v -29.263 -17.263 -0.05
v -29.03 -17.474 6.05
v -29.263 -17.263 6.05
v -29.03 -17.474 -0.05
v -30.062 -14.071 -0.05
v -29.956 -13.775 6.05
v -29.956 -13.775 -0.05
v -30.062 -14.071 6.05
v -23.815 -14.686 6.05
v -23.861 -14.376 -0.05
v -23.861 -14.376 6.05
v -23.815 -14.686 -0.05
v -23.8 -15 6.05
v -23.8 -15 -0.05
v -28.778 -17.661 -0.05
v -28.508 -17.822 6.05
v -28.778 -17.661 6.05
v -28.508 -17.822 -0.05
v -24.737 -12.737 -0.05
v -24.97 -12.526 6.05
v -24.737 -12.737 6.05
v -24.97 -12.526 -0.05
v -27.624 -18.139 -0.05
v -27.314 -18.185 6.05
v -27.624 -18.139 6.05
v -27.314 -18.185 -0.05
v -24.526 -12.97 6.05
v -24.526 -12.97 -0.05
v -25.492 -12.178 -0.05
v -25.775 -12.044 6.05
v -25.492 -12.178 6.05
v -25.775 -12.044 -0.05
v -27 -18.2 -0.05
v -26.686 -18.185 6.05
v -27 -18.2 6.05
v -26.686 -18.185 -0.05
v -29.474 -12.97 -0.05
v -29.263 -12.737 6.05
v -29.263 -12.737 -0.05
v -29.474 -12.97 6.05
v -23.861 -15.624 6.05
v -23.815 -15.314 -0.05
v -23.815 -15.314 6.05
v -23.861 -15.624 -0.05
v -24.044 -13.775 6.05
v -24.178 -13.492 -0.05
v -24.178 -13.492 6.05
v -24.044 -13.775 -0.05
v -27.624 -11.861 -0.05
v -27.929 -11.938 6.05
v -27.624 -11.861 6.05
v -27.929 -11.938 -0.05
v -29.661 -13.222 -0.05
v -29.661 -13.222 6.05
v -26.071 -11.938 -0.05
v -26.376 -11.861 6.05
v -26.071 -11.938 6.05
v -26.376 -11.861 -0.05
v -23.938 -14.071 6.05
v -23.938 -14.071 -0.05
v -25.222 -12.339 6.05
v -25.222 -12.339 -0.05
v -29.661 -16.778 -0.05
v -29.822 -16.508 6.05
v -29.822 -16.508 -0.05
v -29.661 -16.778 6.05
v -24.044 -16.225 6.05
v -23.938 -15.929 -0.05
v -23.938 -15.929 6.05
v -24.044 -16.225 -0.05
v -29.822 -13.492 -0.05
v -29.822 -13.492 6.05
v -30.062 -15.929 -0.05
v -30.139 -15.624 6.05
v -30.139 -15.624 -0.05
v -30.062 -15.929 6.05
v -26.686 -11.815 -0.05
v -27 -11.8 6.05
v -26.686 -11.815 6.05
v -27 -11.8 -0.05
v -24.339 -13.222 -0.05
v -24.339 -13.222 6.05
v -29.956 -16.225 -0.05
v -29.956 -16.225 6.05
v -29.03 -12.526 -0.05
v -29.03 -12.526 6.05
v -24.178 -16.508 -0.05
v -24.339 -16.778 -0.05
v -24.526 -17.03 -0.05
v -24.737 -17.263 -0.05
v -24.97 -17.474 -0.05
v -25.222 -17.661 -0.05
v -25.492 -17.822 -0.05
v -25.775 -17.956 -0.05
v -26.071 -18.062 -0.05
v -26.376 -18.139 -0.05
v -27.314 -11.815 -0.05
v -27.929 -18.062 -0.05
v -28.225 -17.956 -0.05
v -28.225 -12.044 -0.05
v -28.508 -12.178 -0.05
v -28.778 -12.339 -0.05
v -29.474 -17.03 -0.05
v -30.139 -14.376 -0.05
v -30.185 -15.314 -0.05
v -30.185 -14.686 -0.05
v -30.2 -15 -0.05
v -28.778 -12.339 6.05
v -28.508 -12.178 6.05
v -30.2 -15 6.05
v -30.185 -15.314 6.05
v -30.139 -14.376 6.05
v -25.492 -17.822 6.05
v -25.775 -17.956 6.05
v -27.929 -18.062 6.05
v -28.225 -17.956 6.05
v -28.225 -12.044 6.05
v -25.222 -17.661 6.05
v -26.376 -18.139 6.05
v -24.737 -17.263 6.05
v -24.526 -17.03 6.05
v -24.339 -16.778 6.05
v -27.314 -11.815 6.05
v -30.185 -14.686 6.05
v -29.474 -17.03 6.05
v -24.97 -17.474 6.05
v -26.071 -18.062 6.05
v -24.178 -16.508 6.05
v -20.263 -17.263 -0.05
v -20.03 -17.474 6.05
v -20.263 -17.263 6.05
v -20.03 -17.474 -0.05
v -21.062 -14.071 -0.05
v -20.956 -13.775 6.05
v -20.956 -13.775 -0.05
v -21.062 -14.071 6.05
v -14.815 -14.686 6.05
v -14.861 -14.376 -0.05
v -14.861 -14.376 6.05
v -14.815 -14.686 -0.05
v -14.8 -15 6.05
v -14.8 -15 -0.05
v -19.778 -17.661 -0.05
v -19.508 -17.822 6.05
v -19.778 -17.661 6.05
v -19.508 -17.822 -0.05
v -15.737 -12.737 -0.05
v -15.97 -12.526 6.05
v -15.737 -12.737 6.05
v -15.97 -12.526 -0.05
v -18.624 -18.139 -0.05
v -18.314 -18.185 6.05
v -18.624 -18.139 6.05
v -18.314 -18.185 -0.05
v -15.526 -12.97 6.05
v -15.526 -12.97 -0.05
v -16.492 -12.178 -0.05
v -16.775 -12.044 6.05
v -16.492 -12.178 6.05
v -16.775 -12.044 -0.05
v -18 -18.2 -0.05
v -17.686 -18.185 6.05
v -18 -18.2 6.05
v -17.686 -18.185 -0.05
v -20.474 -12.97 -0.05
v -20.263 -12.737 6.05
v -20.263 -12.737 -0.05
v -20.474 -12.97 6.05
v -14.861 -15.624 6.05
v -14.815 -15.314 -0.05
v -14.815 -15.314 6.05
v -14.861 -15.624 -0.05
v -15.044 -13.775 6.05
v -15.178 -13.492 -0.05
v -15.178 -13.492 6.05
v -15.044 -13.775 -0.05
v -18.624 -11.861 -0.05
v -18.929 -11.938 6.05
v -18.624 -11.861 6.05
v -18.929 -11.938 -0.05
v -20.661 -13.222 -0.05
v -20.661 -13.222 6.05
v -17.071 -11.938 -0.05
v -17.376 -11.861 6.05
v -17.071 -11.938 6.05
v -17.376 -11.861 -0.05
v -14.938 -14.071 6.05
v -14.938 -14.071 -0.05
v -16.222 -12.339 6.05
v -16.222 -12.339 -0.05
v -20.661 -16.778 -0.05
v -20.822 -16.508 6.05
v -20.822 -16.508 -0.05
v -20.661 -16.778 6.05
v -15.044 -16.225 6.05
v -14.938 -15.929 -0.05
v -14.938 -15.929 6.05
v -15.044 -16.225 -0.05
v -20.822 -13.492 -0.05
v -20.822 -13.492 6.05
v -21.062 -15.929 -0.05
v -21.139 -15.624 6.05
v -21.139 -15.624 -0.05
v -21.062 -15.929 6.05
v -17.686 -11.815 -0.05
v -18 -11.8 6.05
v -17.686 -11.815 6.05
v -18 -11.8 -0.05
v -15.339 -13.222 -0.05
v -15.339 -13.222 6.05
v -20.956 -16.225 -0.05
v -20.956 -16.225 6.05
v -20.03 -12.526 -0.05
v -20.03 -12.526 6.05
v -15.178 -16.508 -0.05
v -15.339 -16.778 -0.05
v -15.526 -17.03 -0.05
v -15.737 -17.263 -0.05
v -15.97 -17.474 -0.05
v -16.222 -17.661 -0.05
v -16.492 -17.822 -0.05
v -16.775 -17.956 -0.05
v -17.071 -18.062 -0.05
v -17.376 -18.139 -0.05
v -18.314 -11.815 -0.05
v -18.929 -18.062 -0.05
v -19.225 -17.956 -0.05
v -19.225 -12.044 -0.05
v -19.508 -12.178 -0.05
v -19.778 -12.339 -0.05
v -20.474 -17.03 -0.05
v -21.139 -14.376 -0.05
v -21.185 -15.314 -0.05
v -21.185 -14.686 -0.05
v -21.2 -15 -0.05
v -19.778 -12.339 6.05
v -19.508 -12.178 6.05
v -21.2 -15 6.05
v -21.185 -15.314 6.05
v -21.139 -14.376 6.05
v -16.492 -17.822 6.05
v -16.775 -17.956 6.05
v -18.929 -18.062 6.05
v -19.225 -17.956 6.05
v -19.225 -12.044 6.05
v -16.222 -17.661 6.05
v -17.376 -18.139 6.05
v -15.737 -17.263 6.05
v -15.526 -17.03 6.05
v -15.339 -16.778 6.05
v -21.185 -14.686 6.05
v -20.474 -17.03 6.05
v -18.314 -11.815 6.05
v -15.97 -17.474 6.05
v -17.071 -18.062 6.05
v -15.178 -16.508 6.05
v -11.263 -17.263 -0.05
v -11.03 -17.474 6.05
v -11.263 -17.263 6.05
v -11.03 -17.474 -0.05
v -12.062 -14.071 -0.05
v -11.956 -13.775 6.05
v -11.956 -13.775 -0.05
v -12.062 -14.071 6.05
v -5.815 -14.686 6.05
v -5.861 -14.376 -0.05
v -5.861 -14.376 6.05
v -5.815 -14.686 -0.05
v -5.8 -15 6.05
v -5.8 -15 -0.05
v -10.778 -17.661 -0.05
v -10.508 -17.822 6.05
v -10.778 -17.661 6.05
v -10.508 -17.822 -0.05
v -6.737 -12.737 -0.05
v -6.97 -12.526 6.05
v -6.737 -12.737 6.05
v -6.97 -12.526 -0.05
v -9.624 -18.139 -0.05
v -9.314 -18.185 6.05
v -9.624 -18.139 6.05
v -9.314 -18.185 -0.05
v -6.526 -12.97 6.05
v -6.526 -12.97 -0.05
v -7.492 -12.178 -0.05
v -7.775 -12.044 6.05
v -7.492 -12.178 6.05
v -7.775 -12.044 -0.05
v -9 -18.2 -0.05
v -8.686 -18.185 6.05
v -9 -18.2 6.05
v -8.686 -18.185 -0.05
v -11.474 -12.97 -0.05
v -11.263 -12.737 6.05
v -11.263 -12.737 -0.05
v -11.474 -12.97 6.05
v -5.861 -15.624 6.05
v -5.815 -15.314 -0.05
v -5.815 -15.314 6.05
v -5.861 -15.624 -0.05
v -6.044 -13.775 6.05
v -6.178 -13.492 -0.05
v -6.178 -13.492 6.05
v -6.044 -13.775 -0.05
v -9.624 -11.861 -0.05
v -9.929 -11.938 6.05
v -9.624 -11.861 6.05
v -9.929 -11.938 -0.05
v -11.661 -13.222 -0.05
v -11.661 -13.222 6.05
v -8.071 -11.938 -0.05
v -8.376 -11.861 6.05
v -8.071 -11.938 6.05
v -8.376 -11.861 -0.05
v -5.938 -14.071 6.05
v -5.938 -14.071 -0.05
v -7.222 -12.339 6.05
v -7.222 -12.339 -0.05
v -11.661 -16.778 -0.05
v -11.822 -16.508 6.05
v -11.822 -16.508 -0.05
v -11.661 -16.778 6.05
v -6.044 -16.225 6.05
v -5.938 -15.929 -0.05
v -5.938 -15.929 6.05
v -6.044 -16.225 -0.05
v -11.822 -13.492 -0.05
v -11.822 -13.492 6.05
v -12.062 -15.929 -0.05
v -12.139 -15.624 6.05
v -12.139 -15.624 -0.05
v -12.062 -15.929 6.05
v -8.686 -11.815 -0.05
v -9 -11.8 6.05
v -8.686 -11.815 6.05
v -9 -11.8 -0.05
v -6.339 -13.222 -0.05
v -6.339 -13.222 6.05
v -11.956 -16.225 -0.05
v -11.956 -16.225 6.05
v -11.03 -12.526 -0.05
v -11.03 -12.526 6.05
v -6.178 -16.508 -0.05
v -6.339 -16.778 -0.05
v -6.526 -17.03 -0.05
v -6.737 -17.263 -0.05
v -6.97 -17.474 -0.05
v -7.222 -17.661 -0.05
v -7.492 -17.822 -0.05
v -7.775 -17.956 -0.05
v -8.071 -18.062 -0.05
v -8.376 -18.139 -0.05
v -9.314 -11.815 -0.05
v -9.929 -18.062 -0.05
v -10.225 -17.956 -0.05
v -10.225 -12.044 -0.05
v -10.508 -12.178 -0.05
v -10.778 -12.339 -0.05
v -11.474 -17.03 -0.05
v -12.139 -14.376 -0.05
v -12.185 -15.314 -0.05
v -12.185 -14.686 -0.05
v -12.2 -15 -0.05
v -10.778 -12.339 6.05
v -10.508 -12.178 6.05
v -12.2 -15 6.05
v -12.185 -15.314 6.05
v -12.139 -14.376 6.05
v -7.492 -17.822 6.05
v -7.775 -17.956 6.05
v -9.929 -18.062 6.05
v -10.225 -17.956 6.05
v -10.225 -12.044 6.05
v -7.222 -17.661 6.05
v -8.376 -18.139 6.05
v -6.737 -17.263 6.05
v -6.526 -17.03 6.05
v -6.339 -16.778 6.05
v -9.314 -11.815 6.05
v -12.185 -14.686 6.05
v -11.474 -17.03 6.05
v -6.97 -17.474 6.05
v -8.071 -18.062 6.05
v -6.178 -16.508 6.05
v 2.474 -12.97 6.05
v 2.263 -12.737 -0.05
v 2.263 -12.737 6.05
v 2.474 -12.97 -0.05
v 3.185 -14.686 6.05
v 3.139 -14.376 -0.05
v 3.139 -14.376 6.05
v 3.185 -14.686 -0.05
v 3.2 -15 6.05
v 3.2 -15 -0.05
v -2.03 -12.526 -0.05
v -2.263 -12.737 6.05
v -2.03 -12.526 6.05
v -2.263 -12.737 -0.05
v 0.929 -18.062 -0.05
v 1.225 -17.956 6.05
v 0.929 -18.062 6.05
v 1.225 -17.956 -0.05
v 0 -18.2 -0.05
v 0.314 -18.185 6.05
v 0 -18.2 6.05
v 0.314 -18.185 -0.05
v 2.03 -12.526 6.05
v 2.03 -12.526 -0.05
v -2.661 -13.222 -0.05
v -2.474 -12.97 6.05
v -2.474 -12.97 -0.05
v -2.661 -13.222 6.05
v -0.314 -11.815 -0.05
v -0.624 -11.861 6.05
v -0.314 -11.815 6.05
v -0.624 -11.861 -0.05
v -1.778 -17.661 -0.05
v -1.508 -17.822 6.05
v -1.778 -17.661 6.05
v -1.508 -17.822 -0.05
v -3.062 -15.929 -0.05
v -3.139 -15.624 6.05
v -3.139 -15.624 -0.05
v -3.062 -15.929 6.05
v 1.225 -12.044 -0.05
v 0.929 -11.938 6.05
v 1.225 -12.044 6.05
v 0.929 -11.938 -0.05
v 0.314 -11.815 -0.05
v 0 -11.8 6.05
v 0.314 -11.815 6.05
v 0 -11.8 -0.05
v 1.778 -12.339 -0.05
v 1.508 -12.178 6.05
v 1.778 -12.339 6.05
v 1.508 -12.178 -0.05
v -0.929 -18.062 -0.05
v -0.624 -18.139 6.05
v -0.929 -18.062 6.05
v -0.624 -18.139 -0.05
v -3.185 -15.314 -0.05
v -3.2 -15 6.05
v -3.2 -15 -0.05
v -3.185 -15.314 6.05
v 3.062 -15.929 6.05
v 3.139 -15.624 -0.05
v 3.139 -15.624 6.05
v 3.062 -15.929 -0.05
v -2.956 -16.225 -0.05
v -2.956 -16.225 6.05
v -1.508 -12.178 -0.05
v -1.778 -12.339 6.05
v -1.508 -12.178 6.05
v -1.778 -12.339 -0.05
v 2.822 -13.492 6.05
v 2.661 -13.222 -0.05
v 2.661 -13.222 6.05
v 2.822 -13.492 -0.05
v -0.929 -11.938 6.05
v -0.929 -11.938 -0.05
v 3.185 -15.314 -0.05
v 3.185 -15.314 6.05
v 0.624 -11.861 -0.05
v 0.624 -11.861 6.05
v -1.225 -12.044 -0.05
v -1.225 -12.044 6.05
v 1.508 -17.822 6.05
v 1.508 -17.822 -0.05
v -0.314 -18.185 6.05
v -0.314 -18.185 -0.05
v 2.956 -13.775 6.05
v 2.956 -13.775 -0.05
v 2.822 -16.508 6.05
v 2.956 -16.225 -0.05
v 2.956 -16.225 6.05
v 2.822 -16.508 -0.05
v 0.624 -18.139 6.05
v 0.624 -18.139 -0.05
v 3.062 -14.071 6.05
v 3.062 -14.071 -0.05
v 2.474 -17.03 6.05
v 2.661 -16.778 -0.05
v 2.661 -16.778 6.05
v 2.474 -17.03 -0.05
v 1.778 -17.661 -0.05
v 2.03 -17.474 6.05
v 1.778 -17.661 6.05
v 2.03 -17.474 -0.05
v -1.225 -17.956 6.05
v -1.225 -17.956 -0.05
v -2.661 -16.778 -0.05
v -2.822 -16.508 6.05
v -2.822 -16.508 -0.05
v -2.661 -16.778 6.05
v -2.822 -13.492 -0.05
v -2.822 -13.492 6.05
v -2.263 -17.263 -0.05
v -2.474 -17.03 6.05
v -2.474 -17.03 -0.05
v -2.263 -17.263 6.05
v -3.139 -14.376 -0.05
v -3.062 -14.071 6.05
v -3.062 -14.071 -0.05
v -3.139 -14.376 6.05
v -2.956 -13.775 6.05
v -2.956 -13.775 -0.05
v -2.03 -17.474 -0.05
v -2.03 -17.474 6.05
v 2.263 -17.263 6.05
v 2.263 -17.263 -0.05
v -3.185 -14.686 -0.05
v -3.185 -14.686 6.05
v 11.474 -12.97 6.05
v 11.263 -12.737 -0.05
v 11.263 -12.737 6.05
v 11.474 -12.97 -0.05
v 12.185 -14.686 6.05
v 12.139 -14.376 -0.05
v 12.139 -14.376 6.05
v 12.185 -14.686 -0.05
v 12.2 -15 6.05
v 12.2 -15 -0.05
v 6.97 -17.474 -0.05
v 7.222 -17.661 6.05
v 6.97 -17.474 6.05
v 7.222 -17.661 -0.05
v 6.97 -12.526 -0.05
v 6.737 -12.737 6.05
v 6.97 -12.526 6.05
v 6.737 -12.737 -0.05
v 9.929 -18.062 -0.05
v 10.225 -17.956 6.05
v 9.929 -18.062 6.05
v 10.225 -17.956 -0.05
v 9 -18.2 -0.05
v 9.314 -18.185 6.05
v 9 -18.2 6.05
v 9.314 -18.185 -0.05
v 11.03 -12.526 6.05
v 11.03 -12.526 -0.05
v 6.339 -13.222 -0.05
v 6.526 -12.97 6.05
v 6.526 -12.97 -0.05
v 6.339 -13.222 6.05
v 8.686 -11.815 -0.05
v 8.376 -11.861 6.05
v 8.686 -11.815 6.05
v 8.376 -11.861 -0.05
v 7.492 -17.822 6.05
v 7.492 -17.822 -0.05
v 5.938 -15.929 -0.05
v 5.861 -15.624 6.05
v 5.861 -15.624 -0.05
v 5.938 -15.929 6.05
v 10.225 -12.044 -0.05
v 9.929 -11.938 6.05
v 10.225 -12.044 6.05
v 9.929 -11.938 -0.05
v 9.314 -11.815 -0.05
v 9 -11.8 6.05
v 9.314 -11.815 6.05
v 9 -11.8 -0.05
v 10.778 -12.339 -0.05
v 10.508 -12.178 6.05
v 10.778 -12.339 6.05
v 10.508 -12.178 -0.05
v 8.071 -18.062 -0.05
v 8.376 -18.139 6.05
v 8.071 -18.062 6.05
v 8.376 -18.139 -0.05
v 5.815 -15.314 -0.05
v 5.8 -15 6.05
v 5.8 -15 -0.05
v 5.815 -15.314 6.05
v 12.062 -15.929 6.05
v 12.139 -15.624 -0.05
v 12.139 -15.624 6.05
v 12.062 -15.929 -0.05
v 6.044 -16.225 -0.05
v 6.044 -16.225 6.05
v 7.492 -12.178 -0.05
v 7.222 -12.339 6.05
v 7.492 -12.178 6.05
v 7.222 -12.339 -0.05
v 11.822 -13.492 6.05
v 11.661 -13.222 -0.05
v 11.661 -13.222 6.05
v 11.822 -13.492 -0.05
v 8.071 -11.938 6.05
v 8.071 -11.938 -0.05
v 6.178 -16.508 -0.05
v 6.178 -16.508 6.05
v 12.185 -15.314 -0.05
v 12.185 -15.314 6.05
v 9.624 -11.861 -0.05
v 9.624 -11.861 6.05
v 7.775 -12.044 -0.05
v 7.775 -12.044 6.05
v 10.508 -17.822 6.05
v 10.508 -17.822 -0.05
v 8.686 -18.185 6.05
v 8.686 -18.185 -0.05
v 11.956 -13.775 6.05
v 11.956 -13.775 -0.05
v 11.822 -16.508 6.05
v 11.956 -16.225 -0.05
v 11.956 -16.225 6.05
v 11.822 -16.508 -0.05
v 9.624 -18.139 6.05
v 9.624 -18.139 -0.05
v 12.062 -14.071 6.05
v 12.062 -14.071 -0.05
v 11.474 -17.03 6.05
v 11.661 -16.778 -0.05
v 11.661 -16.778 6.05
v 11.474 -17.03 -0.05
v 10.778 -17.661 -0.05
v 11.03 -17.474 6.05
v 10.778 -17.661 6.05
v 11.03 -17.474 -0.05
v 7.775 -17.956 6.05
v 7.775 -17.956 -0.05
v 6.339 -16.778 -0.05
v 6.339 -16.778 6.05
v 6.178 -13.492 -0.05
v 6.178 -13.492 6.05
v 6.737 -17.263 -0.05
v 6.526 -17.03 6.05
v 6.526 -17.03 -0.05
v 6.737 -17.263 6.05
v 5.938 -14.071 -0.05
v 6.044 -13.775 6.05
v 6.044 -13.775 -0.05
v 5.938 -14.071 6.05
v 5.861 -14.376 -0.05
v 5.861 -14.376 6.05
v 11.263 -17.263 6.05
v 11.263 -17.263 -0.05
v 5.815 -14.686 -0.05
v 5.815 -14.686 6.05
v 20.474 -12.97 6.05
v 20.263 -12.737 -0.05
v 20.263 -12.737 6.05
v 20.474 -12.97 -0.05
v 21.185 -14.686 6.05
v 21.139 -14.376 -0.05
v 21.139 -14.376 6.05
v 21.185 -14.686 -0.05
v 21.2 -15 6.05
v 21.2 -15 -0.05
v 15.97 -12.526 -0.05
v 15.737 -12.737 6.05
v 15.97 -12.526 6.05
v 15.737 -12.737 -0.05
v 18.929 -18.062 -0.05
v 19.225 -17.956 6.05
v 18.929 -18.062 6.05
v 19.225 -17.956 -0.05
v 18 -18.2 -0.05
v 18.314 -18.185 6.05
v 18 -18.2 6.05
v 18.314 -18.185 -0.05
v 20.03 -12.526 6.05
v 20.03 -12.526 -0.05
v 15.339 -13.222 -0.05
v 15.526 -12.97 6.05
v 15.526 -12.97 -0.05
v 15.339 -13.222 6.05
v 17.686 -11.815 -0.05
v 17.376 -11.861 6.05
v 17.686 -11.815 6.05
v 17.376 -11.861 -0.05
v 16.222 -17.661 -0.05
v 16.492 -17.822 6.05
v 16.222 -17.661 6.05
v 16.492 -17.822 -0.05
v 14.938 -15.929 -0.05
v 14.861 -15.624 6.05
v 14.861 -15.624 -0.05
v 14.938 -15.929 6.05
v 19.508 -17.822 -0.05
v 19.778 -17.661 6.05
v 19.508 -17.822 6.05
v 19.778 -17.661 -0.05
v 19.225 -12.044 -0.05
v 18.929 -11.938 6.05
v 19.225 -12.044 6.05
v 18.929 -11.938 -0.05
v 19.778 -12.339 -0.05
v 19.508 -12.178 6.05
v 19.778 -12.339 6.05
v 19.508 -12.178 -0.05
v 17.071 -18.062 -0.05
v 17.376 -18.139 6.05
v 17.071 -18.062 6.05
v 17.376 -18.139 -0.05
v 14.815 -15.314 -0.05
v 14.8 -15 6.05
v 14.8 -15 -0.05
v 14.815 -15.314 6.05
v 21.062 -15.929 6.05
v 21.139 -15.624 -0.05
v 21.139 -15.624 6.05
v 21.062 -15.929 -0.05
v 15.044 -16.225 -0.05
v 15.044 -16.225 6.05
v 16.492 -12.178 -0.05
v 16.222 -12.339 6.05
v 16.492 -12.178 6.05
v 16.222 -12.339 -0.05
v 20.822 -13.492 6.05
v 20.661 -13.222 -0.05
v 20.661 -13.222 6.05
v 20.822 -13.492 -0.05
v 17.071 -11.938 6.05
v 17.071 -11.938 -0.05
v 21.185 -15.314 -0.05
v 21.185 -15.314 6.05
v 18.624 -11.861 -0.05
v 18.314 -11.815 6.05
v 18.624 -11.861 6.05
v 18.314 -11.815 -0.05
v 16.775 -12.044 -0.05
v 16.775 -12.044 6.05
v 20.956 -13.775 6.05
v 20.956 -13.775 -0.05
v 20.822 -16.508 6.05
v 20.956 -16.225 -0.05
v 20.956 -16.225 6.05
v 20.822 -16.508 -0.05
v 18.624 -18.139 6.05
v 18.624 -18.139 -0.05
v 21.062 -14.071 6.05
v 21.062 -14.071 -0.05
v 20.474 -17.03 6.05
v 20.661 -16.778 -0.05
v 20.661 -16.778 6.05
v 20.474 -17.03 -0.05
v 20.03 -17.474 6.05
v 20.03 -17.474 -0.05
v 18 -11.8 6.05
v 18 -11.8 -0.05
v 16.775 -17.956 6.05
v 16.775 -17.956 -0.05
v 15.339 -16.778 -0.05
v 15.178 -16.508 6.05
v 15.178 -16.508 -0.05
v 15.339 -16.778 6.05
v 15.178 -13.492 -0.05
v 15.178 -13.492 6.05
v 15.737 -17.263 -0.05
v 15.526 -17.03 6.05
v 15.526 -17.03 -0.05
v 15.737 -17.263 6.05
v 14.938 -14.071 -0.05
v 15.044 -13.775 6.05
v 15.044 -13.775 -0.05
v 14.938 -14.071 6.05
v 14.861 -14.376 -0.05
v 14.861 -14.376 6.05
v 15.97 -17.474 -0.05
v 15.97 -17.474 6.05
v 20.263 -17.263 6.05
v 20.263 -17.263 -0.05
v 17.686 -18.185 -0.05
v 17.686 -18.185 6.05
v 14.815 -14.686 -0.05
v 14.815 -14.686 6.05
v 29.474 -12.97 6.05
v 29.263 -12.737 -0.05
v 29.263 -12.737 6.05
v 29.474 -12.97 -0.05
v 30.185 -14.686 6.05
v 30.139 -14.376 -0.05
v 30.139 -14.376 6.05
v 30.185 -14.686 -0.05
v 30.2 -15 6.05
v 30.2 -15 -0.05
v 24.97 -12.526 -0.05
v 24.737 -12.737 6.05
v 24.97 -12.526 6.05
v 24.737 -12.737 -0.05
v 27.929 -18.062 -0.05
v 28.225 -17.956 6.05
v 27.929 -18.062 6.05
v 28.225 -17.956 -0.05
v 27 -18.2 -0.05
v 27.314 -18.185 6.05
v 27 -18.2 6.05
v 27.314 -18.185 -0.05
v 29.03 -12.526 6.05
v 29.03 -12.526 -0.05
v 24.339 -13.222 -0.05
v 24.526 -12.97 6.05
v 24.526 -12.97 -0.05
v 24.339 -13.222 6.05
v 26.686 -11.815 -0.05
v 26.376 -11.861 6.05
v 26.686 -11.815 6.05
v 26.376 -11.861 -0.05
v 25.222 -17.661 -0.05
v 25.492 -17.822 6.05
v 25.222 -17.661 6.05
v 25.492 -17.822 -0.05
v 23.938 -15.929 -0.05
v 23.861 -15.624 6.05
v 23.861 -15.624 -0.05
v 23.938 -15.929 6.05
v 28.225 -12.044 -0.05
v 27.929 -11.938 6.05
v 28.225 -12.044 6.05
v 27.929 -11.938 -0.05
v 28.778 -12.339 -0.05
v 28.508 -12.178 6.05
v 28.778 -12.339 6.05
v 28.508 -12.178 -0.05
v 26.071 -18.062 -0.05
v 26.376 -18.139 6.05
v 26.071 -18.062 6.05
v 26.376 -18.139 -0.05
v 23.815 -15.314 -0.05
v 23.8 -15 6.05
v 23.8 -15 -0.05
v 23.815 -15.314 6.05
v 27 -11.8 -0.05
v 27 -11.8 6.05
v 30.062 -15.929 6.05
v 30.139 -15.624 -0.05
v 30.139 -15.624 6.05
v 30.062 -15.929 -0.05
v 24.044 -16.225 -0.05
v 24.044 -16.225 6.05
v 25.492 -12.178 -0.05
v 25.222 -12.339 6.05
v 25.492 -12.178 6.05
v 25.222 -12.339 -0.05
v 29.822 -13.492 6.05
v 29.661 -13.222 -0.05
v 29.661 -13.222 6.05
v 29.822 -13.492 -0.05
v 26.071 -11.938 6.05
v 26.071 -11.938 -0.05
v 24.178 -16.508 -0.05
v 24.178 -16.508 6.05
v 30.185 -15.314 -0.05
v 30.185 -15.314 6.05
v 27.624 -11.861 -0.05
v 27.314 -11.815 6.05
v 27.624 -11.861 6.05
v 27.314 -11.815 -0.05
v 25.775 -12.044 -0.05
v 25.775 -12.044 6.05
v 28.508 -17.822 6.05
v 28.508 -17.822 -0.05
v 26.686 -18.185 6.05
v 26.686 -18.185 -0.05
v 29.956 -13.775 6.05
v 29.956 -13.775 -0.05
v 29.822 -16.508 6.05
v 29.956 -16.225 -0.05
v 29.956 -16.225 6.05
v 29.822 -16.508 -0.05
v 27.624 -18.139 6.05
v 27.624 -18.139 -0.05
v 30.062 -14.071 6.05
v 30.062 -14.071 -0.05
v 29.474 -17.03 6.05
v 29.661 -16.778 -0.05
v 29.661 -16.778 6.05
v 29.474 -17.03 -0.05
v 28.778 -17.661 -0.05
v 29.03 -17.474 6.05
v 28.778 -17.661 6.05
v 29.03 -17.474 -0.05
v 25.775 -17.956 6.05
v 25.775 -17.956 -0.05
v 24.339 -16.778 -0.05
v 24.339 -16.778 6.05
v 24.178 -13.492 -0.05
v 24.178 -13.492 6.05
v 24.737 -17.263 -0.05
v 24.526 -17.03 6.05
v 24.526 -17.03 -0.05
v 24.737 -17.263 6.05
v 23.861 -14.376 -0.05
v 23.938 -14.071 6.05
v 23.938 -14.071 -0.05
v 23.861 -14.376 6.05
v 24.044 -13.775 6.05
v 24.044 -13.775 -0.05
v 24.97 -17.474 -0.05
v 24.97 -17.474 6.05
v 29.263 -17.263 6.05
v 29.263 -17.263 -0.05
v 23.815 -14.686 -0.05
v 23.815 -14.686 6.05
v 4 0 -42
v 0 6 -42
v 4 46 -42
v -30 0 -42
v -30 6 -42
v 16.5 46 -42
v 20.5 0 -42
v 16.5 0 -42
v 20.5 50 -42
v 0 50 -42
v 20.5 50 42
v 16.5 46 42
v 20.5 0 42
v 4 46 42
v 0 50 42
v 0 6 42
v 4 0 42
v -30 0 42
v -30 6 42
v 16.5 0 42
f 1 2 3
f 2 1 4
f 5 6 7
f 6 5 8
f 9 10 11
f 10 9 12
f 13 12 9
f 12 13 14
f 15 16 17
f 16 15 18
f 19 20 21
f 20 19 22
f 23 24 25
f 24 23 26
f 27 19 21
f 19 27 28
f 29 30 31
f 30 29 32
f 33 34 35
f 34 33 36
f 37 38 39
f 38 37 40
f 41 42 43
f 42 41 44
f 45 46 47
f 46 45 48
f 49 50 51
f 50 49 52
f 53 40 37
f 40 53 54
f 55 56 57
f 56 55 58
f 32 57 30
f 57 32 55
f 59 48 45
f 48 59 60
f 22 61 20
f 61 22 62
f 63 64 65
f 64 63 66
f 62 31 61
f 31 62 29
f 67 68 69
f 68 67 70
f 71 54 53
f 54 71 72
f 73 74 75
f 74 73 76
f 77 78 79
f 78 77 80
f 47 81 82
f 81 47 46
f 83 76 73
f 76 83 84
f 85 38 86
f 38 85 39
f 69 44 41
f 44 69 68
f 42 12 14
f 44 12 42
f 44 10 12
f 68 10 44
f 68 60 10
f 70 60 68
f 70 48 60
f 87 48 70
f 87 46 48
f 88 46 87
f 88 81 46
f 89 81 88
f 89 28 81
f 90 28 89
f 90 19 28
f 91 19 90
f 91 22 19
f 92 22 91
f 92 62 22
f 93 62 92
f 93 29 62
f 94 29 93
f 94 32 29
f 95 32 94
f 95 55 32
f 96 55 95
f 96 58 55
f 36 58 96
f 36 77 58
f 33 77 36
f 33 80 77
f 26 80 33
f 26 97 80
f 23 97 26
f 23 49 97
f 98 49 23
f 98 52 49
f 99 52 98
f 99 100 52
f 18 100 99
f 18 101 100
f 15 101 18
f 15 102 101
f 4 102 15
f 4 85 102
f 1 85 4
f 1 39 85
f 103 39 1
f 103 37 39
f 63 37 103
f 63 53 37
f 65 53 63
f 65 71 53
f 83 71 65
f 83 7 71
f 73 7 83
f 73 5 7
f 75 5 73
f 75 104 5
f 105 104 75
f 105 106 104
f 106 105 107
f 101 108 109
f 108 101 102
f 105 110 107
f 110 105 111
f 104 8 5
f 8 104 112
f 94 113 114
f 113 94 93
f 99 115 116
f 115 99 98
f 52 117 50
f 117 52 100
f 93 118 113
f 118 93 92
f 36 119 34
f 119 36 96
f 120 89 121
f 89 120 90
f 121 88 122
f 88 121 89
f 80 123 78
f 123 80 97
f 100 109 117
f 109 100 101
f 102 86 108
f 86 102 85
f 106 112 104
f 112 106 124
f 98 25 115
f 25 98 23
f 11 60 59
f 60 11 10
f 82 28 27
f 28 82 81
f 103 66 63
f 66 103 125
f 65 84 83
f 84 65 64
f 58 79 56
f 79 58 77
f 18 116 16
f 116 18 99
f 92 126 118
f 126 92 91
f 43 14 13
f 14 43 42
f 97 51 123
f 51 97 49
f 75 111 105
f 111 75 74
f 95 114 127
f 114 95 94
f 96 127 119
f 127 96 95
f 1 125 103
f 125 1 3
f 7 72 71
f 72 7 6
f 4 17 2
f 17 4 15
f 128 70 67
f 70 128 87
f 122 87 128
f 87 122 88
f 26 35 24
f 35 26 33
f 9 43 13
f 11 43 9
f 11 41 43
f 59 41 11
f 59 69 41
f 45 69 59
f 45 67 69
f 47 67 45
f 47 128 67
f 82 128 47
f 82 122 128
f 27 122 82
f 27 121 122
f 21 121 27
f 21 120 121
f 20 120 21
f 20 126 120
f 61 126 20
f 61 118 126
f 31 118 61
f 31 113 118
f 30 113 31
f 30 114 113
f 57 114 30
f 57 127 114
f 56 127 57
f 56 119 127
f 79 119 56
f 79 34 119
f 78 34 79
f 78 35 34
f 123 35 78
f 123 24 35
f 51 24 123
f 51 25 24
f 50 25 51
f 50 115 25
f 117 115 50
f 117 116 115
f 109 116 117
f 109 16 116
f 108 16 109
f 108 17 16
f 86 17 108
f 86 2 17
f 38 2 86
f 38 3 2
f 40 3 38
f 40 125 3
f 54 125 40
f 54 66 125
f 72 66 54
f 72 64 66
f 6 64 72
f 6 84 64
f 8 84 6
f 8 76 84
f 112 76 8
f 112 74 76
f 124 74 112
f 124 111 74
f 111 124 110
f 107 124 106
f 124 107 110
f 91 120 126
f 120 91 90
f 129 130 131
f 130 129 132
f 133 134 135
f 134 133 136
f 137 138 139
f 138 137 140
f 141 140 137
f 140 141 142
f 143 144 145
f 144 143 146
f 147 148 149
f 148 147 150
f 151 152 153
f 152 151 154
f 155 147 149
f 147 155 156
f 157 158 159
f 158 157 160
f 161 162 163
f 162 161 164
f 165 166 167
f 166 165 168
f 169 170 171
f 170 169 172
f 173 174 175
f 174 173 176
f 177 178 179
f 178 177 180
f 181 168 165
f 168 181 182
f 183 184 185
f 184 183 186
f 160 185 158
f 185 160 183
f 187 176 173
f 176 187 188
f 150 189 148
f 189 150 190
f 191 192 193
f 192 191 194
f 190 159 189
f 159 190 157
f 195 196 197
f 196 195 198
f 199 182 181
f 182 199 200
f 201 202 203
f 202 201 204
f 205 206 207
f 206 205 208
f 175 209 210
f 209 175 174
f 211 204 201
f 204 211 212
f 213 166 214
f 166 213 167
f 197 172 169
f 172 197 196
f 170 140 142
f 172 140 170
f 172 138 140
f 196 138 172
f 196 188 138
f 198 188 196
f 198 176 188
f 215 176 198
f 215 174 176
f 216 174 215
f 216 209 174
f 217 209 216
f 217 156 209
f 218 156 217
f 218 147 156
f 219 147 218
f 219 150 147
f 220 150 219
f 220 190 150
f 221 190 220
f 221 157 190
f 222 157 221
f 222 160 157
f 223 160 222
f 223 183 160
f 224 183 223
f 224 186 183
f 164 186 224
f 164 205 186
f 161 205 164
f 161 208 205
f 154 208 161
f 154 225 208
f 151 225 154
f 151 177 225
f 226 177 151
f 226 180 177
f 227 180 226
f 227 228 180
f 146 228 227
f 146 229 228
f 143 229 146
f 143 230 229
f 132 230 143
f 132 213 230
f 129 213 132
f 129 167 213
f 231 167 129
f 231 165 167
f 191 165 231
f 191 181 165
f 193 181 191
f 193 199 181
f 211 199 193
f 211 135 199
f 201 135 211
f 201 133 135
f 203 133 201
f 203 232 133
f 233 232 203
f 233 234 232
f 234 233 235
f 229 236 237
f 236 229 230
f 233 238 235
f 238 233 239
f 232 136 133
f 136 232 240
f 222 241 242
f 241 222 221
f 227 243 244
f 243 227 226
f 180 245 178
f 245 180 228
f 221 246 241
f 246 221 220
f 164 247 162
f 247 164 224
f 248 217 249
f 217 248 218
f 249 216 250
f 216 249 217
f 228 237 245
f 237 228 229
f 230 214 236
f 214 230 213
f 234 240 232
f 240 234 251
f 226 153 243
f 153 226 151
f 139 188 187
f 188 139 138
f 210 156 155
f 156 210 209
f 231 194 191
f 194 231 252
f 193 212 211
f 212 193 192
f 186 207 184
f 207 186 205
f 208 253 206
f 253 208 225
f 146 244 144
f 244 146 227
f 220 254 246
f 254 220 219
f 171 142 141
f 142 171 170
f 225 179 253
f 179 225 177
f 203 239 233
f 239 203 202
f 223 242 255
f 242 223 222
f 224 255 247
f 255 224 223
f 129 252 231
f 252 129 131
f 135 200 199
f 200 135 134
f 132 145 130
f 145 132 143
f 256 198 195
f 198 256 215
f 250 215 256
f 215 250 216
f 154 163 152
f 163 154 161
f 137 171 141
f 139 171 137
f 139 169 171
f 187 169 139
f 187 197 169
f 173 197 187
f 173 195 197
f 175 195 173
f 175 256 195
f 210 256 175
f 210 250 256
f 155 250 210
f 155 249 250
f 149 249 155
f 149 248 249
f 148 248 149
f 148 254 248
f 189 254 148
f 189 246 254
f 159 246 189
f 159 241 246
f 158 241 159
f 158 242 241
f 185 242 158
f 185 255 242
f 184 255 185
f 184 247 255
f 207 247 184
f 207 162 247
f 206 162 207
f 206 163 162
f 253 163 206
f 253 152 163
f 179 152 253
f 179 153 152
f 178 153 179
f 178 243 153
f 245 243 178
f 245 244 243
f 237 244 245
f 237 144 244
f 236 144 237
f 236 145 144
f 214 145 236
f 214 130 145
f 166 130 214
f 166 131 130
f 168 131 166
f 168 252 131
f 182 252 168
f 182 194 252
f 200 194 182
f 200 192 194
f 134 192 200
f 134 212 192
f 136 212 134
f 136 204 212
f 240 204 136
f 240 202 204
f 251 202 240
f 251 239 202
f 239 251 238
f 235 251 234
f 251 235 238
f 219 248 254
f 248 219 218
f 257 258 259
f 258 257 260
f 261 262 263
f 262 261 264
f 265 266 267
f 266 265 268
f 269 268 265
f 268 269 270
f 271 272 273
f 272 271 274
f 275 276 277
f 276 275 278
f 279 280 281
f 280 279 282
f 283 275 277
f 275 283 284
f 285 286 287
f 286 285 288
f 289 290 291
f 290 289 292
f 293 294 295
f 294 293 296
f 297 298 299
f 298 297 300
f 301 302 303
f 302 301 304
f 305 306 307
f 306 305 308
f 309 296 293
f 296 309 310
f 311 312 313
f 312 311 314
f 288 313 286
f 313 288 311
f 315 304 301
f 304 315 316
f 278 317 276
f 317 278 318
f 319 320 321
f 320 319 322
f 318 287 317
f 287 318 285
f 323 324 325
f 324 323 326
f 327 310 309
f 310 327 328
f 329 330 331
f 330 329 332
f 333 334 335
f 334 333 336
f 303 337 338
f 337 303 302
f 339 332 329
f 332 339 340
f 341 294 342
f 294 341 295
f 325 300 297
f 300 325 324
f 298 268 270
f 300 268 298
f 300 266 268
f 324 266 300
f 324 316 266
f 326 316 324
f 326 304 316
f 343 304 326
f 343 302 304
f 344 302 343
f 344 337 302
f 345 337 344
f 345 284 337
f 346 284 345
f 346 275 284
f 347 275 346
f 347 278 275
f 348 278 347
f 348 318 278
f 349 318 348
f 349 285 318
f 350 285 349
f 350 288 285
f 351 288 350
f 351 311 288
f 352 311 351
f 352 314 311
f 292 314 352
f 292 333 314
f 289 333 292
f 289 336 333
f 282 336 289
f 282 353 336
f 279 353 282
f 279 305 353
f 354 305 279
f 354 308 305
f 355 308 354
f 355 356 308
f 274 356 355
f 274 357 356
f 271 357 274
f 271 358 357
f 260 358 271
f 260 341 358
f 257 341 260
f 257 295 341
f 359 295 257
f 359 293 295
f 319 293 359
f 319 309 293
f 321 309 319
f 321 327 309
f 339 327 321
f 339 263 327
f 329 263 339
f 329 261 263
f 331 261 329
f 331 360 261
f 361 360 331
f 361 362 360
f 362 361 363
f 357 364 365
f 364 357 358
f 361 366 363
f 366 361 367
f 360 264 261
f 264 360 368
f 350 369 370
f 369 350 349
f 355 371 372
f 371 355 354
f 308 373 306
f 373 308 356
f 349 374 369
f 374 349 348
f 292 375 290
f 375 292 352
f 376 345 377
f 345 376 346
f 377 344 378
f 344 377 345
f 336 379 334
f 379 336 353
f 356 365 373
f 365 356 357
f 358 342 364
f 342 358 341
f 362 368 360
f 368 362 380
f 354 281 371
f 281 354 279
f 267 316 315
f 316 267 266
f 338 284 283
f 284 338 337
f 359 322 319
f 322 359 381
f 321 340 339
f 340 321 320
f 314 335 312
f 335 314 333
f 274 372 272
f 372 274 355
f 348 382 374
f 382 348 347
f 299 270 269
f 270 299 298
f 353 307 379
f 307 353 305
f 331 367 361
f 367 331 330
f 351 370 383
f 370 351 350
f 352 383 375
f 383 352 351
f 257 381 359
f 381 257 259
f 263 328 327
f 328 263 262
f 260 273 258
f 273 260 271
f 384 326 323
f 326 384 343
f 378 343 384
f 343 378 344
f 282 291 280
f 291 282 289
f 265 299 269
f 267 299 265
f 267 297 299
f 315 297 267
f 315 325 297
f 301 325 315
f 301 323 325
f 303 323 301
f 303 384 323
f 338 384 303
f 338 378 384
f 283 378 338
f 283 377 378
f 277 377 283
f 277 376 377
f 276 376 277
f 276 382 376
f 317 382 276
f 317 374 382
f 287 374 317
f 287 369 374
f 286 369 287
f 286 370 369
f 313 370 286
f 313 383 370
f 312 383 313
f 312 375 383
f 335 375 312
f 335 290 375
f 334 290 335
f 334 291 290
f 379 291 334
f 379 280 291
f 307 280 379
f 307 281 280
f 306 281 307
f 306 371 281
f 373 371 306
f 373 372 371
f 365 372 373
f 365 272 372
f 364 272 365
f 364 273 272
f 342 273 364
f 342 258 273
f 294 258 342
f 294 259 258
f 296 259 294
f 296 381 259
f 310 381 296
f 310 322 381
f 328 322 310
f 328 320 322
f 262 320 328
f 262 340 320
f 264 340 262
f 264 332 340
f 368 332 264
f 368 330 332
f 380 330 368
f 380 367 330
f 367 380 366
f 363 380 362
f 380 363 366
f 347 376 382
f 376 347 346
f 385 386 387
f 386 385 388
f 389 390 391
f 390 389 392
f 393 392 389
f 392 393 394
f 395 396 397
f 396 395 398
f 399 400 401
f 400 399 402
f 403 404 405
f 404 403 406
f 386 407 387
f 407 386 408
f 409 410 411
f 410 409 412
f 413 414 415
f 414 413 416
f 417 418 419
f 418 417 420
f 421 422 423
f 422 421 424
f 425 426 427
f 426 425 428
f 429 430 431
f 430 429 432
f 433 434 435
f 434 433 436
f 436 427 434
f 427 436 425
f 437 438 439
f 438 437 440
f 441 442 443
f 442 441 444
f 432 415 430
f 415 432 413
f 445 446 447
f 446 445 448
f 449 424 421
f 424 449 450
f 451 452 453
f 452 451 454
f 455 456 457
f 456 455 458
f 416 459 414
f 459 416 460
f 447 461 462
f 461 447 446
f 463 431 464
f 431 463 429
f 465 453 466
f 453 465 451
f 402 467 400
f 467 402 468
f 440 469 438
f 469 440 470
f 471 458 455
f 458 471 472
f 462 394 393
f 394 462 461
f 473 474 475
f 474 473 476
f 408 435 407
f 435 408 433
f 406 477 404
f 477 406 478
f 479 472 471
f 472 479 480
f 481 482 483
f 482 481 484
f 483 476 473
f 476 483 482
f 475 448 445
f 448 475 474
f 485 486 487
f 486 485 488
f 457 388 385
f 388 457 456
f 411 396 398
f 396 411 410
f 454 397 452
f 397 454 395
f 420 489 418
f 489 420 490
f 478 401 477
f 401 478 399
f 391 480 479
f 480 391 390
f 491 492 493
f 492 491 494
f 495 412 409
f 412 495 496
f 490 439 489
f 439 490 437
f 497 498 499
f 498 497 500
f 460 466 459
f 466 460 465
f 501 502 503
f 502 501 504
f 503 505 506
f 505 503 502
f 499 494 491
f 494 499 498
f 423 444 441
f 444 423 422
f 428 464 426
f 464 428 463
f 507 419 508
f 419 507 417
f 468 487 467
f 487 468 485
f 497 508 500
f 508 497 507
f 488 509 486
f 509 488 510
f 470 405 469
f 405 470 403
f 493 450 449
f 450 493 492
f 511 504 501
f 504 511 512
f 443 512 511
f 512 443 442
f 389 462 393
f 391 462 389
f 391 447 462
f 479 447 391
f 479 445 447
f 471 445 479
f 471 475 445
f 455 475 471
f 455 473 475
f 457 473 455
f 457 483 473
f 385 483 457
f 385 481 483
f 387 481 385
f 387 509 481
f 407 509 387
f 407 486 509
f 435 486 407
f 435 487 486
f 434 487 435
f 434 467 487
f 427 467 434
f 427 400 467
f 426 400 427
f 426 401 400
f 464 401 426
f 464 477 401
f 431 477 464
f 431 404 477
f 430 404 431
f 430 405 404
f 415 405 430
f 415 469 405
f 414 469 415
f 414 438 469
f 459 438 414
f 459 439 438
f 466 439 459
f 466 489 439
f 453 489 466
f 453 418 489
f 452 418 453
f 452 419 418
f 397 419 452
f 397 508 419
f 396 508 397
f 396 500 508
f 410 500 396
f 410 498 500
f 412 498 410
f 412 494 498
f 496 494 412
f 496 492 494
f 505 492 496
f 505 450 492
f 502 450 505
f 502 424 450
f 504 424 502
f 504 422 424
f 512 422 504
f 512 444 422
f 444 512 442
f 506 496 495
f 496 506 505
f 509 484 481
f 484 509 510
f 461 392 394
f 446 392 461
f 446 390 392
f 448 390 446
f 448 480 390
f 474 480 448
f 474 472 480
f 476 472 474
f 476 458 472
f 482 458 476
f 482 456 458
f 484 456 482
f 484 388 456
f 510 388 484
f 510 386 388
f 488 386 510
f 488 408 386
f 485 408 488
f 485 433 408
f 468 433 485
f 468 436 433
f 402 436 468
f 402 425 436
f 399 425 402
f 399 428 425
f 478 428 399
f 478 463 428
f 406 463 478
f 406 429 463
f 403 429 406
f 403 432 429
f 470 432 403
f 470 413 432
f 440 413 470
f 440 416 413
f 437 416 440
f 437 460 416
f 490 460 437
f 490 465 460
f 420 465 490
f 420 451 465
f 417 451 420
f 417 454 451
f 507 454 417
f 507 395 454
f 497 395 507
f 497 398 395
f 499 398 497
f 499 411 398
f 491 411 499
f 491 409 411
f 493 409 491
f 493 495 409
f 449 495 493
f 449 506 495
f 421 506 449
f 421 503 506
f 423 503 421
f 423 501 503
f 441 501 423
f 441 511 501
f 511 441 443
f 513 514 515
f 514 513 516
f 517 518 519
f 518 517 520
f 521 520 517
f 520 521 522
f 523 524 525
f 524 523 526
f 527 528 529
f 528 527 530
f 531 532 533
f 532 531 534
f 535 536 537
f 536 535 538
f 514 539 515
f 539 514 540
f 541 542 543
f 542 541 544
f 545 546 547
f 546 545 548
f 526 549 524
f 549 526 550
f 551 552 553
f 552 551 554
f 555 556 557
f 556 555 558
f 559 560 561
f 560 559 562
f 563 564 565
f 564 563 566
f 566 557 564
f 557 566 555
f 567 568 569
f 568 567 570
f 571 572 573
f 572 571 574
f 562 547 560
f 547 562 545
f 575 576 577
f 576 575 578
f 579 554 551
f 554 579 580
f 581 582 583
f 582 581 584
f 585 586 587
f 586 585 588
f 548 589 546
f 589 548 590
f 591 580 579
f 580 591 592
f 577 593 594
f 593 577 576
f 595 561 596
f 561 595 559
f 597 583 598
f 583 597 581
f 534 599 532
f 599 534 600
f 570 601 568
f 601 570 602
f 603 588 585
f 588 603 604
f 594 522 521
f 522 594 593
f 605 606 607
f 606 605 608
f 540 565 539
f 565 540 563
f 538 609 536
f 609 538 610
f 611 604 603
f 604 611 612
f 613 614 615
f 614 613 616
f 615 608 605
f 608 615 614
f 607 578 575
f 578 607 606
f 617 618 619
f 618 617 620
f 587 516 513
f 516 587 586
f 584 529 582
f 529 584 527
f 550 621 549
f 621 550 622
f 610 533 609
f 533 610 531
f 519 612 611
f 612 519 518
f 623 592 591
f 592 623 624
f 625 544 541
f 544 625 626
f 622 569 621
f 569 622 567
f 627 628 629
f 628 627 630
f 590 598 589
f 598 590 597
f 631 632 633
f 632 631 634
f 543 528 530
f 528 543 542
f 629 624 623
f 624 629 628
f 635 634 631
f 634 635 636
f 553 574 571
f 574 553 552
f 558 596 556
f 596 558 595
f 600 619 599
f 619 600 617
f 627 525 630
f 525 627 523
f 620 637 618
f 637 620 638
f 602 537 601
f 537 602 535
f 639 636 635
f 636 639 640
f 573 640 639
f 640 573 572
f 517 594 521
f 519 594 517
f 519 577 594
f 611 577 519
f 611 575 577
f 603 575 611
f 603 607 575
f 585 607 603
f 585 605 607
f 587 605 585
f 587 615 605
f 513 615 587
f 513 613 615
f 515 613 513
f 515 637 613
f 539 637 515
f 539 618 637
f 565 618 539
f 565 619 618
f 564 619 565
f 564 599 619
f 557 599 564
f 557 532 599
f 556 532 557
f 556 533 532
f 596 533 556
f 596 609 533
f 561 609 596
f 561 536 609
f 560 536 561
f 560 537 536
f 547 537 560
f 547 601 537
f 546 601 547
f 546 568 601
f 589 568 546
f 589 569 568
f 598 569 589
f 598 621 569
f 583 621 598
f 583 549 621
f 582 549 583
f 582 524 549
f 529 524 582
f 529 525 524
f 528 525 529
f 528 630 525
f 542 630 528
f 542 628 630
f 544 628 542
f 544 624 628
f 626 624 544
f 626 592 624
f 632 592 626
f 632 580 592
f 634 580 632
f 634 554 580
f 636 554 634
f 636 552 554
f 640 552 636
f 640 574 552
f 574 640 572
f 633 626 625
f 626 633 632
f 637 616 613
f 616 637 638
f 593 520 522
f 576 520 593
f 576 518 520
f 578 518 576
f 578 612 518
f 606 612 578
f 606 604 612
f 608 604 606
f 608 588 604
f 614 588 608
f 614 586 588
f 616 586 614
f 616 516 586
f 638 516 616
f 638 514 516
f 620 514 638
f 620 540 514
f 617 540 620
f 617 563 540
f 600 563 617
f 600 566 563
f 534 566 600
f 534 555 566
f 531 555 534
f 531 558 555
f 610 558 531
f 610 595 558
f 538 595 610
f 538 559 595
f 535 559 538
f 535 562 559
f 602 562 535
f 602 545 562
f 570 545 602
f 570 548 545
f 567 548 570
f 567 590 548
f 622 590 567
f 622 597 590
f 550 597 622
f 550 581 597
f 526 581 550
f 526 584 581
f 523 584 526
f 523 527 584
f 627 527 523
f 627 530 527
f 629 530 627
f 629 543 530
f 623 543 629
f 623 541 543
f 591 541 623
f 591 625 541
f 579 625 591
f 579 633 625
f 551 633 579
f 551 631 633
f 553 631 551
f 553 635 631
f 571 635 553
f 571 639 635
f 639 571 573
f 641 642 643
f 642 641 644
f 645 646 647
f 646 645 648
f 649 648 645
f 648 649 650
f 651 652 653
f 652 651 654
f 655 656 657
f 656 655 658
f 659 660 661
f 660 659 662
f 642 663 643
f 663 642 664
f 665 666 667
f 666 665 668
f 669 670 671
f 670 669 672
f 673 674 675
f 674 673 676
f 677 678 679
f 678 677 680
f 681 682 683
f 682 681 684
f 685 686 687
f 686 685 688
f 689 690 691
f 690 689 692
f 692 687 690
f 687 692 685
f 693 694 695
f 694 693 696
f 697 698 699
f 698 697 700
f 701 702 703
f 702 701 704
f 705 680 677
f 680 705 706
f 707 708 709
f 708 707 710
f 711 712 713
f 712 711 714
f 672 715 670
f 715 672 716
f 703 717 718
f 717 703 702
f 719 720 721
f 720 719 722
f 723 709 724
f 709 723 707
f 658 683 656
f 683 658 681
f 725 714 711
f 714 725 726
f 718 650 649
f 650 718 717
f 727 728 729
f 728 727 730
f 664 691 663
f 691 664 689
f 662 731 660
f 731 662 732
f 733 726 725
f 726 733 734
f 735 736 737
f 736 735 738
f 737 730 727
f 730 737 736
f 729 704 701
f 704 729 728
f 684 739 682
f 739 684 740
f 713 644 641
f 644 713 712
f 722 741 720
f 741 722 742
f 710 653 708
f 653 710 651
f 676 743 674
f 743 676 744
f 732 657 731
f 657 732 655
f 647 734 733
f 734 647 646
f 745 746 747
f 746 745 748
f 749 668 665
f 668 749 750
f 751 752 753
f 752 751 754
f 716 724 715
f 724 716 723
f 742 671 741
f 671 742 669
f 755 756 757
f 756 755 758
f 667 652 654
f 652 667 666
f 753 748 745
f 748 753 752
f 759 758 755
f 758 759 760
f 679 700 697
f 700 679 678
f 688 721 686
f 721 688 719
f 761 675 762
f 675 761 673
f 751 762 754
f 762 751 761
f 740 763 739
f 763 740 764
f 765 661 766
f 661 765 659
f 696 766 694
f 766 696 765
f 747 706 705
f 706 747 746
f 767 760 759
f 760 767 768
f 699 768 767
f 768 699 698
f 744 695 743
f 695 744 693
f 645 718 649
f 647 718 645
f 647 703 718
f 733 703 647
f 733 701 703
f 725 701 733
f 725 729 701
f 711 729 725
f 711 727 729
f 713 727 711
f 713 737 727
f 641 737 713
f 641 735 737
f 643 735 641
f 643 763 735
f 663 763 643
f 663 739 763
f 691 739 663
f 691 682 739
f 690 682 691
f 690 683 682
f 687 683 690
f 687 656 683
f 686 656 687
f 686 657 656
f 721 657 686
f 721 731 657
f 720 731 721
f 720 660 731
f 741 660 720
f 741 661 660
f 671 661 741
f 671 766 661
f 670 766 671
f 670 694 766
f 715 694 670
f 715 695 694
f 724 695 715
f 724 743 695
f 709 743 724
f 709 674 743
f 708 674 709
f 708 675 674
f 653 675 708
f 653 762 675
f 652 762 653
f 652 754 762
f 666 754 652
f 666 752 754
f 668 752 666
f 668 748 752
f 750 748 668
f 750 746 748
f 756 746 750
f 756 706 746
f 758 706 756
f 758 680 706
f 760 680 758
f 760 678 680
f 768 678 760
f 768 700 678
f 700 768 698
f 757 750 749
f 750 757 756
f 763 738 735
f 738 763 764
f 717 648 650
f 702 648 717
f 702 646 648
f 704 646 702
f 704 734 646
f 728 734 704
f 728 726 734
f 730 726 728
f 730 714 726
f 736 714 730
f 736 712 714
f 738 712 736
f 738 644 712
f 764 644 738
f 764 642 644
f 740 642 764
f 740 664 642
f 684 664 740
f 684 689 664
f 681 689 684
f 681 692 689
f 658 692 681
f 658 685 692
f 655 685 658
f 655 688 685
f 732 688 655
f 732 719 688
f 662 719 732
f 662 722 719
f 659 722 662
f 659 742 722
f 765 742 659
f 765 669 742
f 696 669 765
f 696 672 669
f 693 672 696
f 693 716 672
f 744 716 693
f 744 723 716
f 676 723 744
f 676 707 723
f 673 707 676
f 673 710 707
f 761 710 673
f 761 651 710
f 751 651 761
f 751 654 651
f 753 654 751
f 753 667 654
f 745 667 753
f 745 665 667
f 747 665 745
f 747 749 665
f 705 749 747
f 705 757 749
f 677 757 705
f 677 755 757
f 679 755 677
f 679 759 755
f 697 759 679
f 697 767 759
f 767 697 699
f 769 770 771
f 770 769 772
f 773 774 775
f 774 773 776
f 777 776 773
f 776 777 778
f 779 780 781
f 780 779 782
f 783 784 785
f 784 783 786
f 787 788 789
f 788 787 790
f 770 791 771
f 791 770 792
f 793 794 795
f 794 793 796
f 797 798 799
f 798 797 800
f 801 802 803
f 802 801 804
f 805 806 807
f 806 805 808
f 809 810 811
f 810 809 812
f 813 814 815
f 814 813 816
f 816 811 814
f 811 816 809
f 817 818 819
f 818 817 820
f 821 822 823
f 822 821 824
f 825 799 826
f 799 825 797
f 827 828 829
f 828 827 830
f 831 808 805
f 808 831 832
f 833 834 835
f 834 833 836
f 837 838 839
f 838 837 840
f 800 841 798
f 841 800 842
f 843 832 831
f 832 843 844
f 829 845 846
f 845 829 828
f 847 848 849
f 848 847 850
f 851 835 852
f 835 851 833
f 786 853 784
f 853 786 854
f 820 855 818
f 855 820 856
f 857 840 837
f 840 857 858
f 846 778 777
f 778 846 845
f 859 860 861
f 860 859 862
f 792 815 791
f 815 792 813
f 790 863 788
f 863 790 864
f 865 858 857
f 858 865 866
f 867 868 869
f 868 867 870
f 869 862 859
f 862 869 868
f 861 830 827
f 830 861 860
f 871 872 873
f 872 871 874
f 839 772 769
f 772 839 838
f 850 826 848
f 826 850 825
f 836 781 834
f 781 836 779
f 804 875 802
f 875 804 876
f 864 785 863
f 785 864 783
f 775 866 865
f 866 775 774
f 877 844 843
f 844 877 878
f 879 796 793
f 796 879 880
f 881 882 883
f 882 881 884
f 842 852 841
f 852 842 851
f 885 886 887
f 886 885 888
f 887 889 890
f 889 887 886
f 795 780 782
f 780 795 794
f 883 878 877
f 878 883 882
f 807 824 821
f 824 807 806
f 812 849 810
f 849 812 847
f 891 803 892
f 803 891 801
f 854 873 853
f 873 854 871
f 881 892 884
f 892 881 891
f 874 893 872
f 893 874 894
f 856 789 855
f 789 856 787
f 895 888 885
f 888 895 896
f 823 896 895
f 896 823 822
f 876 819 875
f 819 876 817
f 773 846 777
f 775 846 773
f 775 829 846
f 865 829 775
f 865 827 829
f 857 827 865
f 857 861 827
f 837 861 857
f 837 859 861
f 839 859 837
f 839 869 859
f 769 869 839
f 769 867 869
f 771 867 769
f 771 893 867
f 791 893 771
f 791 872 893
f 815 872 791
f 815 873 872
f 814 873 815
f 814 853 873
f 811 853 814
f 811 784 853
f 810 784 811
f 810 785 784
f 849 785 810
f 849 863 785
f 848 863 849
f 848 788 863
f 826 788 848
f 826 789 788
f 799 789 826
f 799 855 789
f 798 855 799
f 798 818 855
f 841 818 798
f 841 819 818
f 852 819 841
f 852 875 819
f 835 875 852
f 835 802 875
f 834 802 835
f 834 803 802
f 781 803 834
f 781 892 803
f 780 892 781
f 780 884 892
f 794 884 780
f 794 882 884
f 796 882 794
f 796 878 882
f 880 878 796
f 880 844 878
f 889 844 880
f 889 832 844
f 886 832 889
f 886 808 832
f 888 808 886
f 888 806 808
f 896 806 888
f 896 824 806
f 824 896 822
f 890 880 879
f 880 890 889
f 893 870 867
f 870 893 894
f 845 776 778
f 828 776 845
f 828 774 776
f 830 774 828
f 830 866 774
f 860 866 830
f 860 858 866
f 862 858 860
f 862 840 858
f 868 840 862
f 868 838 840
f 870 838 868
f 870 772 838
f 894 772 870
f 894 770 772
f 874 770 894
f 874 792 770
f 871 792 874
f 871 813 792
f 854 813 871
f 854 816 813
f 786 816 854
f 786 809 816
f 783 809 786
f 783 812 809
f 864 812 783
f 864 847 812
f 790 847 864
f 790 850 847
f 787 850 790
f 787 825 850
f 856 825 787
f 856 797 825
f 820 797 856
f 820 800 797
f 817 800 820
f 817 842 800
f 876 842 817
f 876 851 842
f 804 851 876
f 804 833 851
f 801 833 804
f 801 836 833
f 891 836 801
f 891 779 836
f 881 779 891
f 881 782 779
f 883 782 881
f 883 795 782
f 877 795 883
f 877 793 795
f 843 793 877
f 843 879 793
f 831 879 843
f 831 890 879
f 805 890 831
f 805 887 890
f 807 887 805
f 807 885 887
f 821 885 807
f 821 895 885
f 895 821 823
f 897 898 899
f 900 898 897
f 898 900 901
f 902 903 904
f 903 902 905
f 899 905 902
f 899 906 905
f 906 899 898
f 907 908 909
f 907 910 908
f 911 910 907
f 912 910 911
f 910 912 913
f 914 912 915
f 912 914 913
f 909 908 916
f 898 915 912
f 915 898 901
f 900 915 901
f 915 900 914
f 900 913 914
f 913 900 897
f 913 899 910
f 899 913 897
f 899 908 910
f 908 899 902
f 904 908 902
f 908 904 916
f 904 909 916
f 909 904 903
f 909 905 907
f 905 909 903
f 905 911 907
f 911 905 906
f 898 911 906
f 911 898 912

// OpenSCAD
// Dimensions (mm)
wall_thickness = 12;
extrusion_length = 84; // along X
inner_leg_y_start = 0;
inner_leg_y_end = 4;
outer_leg_y_start = 16.5;
outer_leg_y_end = 20.5;
leg_z_start = 0;
leg_z_end = 50;
bridge_z_start = 46;
bridge_z_end = 50;
wall_gap = 12.5;
ledge_thickness = 6;
ledge_y_start = -30;
ledge_y_end = 0;
tube_hole_diameter = 6.4;
tube_spacing = 9;
tube_y_pos = -15;

$fn = 64;

// Main profile in YZ plane, extruded along X
linear_extrude(height = extrusion_length, center = true)
union() {
    // Inner leg
    translate([inner_leg_y_start, leg_z_start])
        square([inner_leg_y_end - inner_leg_y_start, leg_z_end - leg_z_start]);
    
    // Outer leg
    translate([outer_leg_y_start, leg_z_start])
        square([outer_leg_y_end - outer_leg_y_start, leg_z_end - leg_z_start]);
    
    // Bridge
    translate([inner_leg_y_end, bridge_z_start])
        square([outer_leg_y_start - inner_leg_y_end, bridge_z_end - bridge_z_start]);
    
    // Ledge
    translate([ledge_y_start, leg_z_start])
        square([ledge_y_end - ledge_y_start, ledge_thickness]);
}

// Tube holes
for (i = [-3, -2, -1, 0, 1, 2, 3]) {
    translate([i * tube_spacing, tube_y_pos, ledge_thickness / 2])
        cylinder(h = ledge_thickness + 0.1, r = tube_hole_diameter / 2, center = true);
}
